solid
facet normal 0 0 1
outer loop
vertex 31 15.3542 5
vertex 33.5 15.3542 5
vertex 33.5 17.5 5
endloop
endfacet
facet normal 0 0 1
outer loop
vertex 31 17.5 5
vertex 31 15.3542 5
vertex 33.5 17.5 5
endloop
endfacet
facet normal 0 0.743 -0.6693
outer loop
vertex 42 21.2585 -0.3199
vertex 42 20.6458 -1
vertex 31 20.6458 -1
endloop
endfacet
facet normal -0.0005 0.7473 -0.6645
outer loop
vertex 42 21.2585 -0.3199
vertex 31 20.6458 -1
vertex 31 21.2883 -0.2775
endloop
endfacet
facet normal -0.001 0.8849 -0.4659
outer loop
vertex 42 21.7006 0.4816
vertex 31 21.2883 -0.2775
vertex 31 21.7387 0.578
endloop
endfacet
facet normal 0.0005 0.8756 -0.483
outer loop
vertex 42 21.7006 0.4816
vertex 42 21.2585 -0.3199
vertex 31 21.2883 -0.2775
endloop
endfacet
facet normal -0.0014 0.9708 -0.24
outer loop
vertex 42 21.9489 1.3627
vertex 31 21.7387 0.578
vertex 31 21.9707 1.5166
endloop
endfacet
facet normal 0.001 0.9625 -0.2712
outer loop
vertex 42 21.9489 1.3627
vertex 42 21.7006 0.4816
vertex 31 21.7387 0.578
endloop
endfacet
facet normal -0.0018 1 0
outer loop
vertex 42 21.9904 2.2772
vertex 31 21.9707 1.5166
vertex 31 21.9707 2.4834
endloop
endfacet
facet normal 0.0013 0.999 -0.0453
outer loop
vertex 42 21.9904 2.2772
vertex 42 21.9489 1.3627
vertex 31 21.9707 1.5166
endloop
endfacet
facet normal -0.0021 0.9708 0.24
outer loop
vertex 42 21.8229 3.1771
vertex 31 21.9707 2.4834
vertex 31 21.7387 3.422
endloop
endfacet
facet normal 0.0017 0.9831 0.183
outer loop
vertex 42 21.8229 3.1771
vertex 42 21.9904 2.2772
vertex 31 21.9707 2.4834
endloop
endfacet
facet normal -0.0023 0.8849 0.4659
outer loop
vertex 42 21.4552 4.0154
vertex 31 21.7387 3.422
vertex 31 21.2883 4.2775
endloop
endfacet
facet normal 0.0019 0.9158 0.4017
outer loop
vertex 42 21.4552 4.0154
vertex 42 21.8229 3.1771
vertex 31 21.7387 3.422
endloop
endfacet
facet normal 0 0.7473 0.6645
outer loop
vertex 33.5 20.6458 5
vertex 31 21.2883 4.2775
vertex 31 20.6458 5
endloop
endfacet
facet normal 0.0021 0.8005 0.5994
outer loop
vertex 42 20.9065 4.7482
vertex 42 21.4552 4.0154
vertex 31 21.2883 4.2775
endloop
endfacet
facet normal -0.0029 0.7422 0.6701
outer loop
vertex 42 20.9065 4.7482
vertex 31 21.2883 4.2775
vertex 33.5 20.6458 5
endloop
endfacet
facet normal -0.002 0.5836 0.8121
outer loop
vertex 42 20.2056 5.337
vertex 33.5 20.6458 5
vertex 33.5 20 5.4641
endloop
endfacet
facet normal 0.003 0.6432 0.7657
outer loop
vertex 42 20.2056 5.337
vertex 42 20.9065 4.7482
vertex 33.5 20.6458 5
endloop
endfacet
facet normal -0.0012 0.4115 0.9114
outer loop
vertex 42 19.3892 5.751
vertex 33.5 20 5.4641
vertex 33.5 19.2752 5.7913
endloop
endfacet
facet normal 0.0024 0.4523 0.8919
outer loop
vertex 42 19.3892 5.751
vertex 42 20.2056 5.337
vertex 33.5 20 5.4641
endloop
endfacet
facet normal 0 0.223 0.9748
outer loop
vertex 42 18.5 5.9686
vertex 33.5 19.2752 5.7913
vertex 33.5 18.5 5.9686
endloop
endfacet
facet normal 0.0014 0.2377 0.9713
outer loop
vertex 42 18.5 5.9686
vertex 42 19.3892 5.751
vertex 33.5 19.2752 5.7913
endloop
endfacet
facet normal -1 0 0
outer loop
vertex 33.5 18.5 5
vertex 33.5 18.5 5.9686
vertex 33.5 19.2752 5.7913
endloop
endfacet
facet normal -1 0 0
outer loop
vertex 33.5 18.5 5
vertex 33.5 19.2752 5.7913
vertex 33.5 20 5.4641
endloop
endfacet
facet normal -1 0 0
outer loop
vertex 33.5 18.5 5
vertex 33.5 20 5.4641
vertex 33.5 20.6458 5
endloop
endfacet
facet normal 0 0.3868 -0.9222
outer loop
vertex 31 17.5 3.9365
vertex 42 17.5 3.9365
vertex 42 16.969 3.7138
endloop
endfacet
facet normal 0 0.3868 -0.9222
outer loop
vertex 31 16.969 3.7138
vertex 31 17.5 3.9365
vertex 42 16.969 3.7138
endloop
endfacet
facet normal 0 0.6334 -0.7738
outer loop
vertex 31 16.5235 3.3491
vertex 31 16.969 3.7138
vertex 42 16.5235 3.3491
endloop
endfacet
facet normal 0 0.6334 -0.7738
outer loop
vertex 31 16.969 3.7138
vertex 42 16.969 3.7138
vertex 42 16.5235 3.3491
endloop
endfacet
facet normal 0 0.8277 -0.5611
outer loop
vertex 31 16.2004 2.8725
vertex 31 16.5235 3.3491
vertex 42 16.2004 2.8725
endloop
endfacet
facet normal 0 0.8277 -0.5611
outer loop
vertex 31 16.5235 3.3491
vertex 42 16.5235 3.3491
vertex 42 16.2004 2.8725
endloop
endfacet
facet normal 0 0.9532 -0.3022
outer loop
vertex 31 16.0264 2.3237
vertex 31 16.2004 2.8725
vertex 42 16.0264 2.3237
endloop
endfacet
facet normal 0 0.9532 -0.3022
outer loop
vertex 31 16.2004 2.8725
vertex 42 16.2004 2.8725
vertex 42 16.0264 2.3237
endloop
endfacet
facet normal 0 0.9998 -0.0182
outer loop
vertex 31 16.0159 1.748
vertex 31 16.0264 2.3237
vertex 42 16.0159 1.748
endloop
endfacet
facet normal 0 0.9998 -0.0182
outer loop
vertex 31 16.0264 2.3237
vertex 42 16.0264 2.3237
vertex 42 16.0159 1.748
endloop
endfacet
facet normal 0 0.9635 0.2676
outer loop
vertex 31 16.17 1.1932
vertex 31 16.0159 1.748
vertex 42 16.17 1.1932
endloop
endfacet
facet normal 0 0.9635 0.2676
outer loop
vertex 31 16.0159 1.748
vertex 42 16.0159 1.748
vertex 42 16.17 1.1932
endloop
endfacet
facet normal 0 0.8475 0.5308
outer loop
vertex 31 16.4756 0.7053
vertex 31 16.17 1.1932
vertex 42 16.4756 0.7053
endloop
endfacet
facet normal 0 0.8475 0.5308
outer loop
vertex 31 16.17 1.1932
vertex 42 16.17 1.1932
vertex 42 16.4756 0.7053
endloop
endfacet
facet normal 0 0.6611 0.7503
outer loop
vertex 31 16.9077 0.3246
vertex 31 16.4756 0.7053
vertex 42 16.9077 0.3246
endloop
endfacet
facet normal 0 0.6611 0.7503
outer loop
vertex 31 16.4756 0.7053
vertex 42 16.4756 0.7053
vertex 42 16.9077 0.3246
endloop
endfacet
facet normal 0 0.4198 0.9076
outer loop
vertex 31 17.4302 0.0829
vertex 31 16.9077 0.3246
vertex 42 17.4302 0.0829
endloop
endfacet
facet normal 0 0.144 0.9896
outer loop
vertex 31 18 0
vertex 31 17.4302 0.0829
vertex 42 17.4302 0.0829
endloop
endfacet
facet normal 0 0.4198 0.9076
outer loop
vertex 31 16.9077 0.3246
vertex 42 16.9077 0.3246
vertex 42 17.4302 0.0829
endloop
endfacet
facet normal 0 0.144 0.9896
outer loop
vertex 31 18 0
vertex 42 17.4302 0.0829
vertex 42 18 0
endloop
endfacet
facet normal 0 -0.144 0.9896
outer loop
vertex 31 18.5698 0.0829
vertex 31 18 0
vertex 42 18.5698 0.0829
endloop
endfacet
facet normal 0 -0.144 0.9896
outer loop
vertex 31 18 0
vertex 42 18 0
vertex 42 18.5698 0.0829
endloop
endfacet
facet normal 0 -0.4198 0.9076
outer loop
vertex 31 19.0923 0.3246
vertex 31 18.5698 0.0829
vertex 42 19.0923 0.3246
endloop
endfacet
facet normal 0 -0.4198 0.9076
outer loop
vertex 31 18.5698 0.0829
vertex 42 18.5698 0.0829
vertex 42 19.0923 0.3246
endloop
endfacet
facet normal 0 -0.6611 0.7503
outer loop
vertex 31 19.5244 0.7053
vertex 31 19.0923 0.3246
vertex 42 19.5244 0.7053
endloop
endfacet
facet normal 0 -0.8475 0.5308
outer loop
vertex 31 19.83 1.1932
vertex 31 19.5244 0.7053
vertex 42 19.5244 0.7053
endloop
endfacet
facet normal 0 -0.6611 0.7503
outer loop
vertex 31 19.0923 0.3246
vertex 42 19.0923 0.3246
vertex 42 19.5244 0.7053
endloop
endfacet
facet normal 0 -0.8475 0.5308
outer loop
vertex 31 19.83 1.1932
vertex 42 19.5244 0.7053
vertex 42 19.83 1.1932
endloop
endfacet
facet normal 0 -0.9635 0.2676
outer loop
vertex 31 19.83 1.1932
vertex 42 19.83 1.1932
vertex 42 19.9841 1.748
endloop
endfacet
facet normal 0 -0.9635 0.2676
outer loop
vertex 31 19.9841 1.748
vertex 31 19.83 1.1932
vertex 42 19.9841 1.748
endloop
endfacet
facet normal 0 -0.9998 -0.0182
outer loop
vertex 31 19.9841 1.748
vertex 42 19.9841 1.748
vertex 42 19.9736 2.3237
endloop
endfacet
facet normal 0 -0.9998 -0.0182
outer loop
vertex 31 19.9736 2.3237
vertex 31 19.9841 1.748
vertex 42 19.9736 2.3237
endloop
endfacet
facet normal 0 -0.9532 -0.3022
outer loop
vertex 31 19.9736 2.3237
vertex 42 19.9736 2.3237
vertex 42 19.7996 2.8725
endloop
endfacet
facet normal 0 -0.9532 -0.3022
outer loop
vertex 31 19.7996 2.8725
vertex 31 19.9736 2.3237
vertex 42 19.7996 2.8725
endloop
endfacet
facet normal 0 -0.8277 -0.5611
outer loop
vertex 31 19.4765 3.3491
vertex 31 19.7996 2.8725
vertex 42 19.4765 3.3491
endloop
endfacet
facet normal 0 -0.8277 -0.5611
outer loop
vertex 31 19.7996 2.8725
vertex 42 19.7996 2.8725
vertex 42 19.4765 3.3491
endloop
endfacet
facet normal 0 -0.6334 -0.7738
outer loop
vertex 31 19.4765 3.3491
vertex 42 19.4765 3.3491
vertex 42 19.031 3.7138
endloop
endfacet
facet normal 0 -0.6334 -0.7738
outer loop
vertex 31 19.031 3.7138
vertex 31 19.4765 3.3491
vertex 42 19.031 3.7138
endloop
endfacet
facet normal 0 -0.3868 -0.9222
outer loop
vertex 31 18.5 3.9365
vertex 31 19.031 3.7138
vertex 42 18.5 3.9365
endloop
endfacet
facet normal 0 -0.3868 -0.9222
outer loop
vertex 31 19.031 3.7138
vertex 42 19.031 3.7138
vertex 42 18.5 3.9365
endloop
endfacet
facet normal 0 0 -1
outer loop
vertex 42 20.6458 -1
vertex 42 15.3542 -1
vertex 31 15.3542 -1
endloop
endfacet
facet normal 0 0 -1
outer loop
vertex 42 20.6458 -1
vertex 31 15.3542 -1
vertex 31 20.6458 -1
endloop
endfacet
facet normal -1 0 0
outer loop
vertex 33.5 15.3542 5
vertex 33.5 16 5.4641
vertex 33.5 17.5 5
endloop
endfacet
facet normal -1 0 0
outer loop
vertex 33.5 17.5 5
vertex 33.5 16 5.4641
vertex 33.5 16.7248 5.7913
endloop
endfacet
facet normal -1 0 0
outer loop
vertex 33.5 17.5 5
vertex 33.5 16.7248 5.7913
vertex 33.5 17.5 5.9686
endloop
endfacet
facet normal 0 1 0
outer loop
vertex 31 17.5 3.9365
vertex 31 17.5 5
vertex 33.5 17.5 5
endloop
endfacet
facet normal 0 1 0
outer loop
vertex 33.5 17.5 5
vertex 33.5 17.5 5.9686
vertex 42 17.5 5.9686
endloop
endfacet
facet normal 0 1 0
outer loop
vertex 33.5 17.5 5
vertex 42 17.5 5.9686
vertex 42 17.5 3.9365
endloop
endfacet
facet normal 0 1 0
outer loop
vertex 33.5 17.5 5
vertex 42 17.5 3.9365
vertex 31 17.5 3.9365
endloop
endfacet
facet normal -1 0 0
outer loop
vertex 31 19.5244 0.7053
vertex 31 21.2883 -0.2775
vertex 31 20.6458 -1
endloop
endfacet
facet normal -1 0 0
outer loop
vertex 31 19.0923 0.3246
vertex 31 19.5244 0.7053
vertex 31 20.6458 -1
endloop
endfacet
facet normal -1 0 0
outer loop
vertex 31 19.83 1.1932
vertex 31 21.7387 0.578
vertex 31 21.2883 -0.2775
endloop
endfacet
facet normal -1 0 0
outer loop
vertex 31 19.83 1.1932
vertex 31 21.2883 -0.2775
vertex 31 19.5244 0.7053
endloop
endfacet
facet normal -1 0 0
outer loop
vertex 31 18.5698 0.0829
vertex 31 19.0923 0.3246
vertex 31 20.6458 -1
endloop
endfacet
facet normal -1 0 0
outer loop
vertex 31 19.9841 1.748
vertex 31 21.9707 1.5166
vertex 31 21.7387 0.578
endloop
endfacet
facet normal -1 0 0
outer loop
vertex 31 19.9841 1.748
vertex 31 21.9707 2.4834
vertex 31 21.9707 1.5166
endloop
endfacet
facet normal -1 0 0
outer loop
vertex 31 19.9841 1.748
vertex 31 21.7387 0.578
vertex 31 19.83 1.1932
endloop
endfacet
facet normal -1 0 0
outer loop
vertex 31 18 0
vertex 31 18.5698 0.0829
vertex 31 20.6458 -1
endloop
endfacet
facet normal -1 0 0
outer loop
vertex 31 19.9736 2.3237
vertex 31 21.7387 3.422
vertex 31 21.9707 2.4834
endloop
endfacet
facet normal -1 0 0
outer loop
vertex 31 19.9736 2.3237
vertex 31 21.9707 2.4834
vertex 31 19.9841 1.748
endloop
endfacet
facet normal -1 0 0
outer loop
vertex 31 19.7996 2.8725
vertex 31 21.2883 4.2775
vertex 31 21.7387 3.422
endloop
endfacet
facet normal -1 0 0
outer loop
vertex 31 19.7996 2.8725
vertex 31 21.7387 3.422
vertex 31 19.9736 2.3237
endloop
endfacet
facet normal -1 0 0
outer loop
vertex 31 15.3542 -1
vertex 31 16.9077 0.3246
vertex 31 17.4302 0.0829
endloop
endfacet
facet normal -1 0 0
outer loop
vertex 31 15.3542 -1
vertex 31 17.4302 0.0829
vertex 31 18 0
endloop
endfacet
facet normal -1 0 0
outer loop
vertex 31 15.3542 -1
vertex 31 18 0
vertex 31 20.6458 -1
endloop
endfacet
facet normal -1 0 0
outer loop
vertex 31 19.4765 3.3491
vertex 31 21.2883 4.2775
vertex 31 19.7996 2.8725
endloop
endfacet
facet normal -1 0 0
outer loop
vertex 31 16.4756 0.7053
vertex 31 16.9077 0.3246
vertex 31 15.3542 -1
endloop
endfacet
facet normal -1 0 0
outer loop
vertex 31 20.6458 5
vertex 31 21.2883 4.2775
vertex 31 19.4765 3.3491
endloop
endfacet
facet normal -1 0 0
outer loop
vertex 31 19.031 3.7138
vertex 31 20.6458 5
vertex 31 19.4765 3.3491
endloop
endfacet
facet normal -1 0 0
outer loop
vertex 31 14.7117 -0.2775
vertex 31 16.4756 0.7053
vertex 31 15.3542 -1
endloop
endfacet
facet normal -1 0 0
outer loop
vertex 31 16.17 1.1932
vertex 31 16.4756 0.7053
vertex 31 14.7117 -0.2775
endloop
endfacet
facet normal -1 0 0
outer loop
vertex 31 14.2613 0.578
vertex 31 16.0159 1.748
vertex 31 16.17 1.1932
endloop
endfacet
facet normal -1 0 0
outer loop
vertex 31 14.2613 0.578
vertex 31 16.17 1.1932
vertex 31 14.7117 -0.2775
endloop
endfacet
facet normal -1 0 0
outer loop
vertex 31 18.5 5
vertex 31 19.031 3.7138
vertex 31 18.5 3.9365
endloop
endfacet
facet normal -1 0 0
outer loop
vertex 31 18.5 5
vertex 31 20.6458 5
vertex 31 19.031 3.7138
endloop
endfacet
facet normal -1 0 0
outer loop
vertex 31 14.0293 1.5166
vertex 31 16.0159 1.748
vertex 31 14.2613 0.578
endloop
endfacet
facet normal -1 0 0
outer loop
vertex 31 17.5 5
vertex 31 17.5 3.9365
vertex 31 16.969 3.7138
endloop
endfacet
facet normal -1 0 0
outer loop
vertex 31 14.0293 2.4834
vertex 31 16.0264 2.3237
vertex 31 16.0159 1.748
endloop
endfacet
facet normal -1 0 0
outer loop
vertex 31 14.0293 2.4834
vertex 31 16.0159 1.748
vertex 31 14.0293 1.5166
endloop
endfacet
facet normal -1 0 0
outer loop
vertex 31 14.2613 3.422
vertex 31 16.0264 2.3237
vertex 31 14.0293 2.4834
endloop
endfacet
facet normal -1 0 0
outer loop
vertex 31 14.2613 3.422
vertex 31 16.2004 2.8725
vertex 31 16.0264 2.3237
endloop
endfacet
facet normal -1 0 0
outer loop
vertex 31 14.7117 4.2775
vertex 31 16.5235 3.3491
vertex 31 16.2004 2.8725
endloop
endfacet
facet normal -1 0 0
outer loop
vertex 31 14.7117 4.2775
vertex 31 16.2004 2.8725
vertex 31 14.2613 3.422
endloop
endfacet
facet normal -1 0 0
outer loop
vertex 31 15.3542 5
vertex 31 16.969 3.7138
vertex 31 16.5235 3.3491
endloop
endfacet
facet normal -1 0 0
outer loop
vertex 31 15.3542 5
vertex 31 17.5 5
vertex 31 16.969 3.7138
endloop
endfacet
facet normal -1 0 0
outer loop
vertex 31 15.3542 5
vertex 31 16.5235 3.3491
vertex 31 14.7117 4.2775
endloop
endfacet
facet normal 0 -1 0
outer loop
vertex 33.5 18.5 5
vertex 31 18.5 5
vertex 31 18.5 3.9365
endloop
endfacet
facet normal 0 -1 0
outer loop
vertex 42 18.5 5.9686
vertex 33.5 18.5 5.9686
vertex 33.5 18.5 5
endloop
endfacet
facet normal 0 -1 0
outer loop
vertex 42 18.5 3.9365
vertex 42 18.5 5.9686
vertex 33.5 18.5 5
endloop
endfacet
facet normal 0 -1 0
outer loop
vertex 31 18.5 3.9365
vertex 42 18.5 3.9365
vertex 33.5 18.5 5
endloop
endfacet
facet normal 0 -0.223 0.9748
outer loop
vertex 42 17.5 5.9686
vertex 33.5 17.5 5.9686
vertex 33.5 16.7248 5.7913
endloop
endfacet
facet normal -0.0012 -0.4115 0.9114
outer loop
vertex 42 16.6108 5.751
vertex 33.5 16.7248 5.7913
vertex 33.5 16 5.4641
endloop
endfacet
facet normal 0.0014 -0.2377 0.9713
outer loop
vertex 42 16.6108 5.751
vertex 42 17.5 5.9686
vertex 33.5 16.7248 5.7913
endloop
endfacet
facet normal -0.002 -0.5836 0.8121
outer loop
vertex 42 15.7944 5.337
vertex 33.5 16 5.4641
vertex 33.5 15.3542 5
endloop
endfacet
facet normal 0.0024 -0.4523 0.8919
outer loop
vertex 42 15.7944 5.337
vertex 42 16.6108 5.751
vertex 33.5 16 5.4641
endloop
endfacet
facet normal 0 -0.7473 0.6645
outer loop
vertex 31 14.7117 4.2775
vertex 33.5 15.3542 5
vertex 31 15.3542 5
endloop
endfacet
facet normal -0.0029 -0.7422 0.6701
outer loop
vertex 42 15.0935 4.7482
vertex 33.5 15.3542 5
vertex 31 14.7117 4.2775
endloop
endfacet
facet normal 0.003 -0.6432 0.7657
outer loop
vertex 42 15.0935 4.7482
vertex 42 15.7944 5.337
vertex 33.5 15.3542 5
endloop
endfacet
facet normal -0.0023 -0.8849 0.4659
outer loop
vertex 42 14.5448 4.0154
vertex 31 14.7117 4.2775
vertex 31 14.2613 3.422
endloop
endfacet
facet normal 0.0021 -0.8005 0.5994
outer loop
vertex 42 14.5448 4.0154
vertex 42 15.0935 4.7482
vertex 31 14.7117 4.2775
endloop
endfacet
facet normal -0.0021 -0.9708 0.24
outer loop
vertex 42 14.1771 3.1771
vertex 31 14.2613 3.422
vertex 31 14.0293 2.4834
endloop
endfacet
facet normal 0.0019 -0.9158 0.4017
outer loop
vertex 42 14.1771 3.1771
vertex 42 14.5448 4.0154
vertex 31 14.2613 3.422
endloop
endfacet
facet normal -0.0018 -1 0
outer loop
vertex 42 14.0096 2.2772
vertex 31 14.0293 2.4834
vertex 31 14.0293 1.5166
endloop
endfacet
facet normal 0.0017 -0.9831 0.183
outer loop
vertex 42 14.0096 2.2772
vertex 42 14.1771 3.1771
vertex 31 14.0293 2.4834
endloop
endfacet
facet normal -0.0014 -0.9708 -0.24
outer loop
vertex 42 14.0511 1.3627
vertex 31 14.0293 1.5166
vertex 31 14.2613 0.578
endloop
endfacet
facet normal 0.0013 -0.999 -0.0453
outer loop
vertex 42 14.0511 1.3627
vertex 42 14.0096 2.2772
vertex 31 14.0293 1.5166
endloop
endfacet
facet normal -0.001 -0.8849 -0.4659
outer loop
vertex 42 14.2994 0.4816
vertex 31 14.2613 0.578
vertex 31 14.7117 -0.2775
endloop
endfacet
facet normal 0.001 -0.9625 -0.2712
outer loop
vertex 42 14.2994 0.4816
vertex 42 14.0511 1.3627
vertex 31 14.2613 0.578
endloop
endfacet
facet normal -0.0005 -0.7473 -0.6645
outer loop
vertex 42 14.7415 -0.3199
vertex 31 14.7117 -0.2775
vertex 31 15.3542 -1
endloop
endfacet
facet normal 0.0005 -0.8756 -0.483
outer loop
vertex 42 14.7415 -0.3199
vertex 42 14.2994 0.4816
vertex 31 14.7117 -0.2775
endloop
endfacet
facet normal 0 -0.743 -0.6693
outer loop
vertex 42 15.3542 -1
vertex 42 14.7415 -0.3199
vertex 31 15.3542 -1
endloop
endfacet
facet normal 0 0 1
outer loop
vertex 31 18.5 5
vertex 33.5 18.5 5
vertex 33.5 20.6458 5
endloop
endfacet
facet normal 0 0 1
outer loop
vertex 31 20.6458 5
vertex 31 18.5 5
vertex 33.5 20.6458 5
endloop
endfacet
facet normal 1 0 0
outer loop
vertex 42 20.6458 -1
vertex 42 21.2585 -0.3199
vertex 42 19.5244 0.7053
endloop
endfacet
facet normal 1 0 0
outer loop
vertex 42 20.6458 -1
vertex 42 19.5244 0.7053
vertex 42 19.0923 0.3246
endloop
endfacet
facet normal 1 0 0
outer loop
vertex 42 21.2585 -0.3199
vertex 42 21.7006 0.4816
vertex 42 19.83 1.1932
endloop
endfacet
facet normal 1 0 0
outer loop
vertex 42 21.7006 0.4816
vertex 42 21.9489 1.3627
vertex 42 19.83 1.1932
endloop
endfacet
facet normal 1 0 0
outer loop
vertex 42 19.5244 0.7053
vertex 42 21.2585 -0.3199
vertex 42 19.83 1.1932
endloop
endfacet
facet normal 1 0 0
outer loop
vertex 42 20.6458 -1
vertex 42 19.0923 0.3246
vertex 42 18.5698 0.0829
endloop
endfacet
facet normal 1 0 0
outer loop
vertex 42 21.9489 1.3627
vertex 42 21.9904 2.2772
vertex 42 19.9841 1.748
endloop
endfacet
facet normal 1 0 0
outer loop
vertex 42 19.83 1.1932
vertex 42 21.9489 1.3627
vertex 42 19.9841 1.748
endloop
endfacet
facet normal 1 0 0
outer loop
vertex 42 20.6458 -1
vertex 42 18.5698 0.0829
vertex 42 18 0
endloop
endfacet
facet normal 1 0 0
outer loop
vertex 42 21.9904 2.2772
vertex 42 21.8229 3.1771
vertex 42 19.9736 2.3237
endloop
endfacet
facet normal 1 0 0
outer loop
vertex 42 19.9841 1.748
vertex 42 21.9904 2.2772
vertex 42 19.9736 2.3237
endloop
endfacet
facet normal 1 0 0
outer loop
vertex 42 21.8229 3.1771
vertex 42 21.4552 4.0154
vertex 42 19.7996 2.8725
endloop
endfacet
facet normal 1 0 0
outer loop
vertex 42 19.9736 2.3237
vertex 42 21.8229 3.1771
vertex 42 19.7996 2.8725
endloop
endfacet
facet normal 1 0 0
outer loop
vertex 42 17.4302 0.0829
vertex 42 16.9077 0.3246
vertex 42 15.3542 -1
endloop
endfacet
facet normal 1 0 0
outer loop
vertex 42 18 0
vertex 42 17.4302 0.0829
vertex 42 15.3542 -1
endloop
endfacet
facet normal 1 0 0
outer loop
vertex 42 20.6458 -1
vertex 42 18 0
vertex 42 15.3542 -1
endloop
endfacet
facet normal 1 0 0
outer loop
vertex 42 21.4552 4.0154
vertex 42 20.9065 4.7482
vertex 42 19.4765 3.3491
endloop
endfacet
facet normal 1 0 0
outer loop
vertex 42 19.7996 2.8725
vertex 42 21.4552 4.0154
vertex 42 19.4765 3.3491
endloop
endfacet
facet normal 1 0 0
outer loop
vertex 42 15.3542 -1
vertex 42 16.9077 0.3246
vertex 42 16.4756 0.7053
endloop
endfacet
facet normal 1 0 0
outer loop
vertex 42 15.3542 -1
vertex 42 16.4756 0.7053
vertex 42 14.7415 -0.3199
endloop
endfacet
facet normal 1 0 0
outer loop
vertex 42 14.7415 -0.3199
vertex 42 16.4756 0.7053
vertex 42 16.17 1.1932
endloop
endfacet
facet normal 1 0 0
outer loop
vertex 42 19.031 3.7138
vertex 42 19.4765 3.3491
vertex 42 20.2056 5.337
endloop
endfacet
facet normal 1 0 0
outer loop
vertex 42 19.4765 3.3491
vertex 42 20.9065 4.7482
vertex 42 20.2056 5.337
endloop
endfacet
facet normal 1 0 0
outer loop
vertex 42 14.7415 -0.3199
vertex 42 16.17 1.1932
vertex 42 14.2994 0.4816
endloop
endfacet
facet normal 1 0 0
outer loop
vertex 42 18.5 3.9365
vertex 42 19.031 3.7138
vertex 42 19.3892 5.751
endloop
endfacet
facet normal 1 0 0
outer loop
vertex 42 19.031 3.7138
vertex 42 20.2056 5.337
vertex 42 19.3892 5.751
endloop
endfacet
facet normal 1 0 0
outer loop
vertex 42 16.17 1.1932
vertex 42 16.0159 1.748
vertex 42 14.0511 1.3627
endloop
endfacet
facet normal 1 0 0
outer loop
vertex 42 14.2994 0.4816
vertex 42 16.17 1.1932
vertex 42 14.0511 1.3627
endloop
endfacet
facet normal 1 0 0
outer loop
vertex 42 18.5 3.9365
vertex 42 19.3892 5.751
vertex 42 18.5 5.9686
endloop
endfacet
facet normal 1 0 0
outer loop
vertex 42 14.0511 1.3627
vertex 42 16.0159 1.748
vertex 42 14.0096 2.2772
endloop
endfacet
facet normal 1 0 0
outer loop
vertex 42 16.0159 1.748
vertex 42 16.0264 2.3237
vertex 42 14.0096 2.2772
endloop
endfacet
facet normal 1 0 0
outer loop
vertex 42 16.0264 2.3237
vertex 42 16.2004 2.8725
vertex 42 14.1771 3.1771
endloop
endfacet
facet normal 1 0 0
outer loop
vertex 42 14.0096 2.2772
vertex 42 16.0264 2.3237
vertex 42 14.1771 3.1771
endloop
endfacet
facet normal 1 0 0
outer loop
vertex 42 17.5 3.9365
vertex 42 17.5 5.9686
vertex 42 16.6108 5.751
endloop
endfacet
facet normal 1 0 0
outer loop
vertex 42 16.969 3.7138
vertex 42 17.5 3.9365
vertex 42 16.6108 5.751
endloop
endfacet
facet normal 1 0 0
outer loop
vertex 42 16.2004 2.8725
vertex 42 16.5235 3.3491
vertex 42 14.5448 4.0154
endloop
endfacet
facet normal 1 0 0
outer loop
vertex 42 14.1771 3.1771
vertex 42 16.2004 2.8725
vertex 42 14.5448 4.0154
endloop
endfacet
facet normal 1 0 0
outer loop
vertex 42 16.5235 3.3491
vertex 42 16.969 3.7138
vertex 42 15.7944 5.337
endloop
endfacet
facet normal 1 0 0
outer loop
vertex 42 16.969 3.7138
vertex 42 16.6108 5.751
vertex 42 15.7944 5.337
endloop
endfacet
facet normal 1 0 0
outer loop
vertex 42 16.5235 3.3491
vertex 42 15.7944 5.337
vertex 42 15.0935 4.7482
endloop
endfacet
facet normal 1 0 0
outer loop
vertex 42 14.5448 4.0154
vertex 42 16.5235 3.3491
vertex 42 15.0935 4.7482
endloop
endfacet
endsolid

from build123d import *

# Parameters (mm, degrees)
SKETCH084_W           = 10
SKETCH084_H           = 2
EXTRUDE079_DEPTH      = 5
SKETCH008_W           = 8
SKETCH008_H           = 2
EXTRUDE006_DEPTH      = 12
EXTRUDE001_DEPTH      = 9
EXTRUDE001_DEPTH_BACK = 2


with BuildPart() as extrude079:
    # Sketch084 → Extrude079 (new body)
    with BuildSketch(Plane.YZ.offset(33.5)):
        with Locations((18, 6)):
            Rectangle(SKETCH084_W, SKETCH084_H)
    extrude(amount=-EXTRUDE079_DEPTH)


with BuildPart() as compound002:
    # Sketch008 → Extrude006 (new body)
    with BuildSketch(Plane.YZ.offset(42)):
        with Locations((18, -2)):
            Rectangle(SKETCH008_W, SKETCH008_H)
    extrude(amount=-EXTRUDE006_DEPTH)

    # Compound002: union Extrude079
    add(extrude079.part)


with BuildPart() as antenna001:
    # Sketch001 → Extrude001 (new body, two sides)
    with BuildSketch(Plane.YZ.offset(33)) as extrude001_sk:
        with BuildLine():
            ThreePointArc((17.5, 3.936492), (18, 0), (18.5, 3.936492))
            Line((18.5, 5.968627), (18.5, 3.936492))
            ThreePointArc((17.5, 5.968627), (18, -2), (18.5, 5.968627))
            Line((17.5, 5.968627), (17.5, 3.936492))
        make_face()
    extrude(amount=EXTRUDE001_DEPTH)
    extrude(extrude001_sk.sketch, amount=-EXTRUDE001_DEPTH_BACK)

    # Cut003: cut Compound002
    add(compound002.part, mode=Mode.SUBTRACT)


solid = antenna001.part
